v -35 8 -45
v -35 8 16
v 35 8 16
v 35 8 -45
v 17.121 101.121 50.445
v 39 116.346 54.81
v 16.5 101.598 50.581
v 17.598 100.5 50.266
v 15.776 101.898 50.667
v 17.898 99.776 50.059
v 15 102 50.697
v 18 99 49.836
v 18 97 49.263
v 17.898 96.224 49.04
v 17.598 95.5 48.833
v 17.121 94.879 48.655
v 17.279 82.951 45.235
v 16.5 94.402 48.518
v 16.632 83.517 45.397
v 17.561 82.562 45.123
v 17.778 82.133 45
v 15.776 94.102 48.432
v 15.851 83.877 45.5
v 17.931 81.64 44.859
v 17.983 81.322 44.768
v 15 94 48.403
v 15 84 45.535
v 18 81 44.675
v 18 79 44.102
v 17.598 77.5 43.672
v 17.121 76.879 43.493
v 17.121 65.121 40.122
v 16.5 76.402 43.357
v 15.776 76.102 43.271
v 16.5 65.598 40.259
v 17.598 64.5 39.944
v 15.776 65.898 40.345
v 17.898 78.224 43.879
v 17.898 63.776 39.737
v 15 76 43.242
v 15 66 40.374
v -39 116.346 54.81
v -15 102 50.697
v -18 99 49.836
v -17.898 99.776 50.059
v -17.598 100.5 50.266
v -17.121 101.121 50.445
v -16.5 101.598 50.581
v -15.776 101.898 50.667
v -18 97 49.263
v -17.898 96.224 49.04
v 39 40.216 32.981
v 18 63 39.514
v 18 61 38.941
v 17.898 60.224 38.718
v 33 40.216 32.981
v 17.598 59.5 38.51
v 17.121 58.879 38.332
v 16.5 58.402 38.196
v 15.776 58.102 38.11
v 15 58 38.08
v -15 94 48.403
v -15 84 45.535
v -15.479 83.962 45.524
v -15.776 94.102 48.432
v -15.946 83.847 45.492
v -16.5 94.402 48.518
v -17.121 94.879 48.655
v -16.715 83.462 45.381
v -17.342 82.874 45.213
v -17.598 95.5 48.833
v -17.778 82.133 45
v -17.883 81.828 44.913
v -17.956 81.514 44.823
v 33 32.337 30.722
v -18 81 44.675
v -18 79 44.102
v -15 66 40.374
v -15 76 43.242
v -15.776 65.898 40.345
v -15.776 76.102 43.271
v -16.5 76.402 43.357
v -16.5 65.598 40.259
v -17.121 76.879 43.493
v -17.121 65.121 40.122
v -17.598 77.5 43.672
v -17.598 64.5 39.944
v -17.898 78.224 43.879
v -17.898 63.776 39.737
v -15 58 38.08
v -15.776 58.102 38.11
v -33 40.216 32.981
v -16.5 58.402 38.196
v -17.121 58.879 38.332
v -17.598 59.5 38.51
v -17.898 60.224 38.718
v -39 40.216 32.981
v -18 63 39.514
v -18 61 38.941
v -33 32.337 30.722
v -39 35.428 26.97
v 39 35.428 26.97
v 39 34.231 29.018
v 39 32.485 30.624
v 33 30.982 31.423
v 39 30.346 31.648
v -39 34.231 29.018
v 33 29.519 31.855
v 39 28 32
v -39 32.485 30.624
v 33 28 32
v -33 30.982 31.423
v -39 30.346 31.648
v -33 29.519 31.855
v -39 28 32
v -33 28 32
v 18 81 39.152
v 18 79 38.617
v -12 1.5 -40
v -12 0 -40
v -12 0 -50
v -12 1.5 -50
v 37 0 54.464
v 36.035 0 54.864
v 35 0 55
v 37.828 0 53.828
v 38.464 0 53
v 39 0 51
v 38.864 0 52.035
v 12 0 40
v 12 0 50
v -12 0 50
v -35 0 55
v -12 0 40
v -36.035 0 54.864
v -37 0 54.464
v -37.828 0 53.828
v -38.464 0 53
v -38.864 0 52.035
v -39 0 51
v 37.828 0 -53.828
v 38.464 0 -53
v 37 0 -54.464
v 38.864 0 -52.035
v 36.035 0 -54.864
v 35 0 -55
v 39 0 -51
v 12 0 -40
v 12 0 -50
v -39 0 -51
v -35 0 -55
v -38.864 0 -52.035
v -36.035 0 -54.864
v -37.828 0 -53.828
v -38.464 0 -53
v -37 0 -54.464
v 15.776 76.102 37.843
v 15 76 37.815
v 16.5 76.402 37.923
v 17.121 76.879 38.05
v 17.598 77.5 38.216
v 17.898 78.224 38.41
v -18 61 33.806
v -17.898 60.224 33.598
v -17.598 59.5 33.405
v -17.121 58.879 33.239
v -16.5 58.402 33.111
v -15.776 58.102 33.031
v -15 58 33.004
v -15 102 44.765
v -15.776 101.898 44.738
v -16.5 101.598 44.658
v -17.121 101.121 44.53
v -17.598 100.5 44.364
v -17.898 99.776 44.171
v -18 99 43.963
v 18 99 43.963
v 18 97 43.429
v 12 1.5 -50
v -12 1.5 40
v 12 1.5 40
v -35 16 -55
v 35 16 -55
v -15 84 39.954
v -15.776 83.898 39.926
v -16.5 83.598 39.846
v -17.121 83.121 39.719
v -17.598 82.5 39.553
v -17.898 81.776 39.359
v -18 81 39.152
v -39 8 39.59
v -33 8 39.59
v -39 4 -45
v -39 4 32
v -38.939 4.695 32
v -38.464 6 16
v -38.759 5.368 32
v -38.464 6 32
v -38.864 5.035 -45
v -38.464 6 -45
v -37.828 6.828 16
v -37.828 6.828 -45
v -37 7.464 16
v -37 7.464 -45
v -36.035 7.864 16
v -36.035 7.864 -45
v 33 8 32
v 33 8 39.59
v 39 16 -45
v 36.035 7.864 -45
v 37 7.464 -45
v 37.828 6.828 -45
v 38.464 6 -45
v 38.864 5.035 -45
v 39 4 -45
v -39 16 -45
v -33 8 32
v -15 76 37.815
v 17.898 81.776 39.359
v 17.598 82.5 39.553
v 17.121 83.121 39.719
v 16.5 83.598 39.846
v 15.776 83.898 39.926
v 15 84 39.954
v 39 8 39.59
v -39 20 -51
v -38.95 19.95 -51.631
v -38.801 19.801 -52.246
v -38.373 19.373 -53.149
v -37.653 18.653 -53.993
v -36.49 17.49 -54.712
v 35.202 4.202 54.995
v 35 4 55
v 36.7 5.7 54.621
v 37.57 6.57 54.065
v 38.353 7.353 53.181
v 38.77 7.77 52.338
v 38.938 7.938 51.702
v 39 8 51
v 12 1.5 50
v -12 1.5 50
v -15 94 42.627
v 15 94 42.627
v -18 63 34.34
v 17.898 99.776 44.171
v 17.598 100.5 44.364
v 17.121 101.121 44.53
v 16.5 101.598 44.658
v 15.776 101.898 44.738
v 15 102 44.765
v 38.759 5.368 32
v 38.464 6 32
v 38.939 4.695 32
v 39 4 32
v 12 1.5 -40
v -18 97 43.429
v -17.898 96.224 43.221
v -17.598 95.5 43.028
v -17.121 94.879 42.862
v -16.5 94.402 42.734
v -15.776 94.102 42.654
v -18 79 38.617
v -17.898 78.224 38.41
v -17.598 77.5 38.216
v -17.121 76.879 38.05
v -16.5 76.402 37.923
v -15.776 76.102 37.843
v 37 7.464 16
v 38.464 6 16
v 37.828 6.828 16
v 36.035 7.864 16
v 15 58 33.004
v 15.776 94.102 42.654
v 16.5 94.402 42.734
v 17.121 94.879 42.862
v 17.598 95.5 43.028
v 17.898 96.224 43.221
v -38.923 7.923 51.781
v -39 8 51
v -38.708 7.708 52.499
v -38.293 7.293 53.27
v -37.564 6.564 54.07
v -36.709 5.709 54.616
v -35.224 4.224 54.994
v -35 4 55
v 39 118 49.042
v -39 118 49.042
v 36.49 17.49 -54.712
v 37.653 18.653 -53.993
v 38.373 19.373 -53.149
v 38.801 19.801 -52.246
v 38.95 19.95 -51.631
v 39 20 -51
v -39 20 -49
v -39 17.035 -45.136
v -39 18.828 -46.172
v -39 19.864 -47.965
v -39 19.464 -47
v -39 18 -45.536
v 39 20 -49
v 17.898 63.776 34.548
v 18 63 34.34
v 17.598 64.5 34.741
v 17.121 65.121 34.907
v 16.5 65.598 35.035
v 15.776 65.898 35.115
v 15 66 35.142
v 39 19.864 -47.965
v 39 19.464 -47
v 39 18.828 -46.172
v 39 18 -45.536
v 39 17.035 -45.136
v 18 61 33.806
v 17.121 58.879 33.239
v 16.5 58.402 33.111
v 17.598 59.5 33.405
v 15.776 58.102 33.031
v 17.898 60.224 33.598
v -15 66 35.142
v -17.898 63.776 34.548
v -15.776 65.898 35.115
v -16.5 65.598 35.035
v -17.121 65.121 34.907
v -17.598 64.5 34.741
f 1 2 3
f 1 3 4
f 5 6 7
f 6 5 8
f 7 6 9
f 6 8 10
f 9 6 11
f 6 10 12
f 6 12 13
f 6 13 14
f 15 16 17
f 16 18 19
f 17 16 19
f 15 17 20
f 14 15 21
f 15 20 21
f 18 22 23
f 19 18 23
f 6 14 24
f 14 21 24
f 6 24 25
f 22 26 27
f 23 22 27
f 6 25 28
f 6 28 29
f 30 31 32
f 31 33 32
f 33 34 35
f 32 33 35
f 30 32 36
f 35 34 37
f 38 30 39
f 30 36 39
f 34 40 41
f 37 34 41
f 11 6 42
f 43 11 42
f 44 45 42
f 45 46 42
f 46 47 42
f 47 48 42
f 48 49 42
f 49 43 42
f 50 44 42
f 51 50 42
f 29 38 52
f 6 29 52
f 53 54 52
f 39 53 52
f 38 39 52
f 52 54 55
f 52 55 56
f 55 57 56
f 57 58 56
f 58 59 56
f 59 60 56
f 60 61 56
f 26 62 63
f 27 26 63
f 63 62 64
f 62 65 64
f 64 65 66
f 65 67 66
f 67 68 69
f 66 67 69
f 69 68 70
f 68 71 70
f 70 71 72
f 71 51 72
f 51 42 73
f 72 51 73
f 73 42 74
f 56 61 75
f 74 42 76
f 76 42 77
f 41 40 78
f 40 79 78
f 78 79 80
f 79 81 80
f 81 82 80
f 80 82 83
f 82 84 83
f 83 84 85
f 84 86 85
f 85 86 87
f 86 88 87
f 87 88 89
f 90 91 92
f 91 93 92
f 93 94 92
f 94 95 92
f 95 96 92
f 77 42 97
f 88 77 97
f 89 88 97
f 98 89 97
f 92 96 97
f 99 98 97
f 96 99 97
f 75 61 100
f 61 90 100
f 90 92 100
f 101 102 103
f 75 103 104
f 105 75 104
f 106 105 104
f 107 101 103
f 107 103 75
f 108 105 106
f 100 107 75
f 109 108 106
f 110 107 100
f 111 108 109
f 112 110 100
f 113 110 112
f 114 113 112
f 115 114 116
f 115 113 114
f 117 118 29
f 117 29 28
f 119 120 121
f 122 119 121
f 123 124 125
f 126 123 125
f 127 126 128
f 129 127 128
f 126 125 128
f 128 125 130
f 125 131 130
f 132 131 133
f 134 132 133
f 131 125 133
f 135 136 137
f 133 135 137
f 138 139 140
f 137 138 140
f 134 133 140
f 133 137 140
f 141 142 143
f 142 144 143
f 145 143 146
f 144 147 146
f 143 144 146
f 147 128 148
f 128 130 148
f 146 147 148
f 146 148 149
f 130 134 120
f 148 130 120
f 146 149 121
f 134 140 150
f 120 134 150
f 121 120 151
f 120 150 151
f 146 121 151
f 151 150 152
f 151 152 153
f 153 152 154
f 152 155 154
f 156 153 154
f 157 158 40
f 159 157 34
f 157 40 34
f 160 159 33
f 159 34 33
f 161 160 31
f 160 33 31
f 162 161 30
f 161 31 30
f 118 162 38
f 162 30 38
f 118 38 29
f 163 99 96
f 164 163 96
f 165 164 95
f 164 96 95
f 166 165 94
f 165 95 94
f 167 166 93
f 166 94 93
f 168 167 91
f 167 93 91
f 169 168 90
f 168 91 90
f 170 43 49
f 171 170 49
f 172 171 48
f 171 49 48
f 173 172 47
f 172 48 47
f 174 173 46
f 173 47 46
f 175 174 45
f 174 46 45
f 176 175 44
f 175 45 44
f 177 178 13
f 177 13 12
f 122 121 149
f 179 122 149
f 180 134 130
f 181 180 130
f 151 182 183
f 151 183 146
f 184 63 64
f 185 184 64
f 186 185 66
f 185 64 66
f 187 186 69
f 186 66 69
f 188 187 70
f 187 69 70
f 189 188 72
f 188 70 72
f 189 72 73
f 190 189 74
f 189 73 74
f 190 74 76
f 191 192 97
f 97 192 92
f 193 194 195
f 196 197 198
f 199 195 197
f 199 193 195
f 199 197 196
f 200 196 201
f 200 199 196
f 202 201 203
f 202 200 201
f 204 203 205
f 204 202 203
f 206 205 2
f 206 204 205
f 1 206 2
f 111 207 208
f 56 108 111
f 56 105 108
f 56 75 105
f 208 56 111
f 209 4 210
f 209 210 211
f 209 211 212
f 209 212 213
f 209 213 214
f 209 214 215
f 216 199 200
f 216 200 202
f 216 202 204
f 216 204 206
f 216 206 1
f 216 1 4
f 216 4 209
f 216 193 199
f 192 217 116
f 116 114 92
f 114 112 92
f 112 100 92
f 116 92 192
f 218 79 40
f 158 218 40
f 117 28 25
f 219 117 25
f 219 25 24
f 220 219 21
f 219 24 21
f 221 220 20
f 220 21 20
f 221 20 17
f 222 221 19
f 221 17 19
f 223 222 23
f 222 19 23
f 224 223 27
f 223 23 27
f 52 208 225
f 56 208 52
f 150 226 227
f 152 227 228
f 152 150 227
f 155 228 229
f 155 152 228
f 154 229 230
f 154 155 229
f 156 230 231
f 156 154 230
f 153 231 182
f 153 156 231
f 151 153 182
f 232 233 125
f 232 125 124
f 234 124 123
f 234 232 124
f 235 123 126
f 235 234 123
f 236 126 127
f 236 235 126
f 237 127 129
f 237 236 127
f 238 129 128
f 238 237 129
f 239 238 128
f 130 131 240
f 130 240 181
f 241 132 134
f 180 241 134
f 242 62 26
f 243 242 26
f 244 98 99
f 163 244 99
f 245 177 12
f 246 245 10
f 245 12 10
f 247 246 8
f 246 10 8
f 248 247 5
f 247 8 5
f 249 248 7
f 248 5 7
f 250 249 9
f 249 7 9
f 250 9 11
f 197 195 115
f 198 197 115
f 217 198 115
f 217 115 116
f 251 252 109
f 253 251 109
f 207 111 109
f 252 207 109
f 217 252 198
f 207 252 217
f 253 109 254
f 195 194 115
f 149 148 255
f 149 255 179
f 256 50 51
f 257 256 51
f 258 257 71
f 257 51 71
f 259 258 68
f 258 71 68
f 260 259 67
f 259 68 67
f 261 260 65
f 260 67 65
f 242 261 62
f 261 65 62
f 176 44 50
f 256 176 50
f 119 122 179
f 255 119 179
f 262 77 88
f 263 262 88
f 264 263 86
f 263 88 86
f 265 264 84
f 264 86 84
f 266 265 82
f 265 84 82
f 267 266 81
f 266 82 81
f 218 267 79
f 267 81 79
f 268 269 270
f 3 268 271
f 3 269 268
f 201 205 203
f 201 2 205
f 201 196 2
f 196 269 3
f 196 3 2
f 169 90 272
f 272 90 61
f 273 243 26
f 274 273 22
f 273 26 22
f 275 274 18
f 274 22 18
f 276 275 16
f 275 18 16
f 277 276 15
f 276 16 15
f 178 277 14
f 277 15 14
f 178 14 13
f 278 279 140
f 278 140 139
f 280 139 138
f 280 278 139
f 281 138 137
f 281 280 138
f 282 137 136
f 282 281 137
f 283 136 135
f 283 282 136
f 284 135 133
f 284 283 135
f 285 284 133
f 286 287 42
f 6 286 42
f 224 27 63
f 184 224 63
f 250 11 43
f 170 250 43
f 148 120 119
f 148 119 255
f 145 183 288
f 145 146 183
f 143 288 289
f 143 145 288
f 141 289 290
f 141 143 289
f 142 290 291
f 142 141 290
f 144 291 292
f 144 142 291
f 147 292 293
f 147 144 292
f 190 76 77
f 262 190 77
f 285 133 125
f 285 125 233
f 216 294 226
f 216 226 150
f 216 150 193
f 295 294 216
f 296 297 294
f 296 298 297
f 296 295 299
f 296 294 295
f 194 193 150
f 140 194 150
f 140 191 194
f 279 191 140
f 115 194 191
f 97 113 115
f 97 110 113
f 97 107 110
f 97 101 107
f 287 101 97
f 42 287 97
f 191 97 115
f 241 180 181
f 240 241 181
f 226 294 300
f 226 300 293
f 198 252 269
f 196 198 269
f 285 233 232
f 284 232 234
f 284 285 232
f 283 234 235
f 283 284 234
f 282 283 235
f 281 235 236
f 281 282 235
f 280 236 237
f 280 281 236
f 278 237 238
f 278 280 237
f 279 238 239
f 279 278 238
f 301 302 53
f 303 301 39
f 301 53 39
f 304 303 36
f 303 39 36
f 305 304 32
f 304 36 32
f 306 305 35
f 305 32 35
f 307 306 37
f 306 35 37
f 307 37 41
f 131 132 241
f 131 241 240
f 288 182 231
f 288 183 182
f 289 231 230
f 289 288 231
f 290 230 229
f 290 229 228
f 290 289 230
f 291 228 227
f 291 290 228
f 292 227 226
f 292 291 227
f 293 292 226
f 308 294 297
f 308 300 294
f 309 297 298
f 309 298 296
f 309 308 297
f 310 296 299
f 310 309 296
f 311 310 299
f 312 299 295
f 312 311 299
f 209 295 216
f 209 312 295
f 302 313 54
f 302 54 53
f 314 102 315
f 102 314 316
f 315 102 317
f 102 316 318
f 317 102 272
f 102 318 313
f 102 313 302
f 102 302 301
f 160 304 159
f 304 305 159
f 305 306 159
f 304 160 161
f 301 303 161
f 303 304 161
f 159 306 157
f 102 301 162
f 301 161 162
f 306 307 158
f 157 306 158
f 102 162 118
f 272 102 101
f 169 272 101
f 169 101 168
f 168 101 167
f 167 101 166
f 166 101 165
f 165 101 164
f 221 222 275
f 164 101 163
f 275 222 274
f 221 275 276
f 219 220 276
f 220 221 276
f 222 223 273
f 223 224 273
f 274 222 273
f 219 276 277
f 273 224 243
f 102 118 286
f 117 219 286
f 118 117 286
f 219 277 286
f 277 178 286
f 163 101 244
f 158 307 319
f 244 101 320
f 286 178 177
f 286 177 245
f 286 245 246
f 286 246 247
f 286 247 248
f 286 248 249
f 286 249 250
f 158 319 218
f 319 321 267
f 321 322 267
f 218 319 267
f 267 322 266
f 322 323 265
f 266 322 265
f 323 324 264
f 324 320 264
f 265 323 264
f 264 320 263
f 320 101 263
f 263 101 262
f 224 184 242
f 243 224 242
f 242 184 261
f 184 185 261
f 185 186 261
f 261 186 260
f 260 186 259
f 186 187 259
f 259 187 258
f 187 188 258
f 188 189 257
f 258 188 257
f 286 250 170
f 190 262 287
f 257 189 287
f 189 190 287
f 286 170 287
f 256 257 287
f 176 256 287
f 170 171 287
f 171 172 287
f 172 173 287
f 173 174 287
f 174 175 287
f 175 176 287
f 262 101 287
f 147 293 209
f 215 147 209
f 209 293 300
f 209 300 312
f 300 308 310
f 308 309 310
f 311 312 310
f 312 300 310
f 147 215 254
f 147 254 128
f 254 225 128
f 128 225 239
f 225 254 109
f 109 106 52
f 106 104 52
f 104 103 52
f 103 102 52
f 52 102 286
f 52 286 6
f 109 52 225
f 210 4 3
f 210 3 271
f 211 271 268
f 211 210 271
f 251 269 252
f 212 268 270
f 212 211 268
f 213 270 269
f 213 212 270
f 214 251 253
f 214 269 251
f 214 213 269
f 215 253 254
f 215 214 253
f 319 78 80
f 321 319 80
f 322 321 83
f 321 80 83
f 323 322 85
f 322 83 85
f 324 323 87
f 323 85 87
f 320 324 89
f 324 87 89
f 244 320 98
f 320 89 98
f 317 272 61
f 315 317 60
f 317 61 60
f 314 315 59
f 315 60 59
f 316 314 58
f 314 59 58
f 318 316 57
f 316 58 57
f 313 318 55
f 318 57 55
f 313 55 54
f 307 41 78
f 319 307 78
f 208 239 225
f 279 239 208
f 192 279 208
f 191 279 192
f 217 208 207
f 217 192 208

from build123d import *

# Parameters (mm, degrees)
EXTRUDE_1_DEPTH     = 78
EXTRUDE_2_DEPTH     = 78
EXTRUDE_4_DEPTH     = 6
CUT_EXTRUDE_3_DEPTH = 80
CUT_EXTRUDE_4_DEPTH = 160.514889587
CUT_EXTRUDE_5_DEPTH = 170.32217811
SKETCH_10_W         = 24
SKETCH_10_H         = 10
CUT_EXTRUDE_6_DEPTH = 1.5
FILLET_1_R          = 4
FILLET_START        = -45
FILLET_6_DEPTH      = 77
FILLET_START_2      = -39
FILLET_6_2_DEPTH    = 78


with BuildPart() as part:
    # 草图1 → 凸台-拉伸1 (new body)
    with BuildSketch(Plane(origin=(-39, 0, 0), x_dir=(0, 0, -1), z_dir=(1, 0, 0))):
        Polygon((55, 0), (-55, 0), (-55, 8), (45, 8), (45, 20), (55, 20), align=None)
    extrude(amount=EXTRUDE_1_DEPTH)

    # 草图2 → 凸台-拉伸2 (add)
    with BuildSketch(Plane(origin=(-39, 0, 0), x_dir=(0, 0, -1), z_dir=(1, 0, 0))):
        Polygon((-17.5, 0), (-49.042, 118), (-54.81, 116.346), (-21.45, 0), align=None)
    extrude(amount=EXTRUDE_2_DEPTH)

    # 草图4 → 凸台-拉伸4 (add)
    with BuildSketch(Plane(origin=(33, 0, 0), x_dir=(0, 0, -1), z_dir=(1, 0, 0))):
        Polygon((-20, 6), (-40, 6), (-32, 45), align=None)
    extrude_4 = extrude(amount=EXTRUDE_4_DEPTH)

    # 镜向1: 凸台-拉伸4 across plane
    add(extrude_4.mirror(Plane(origin=(0, 0, 0), x_dir=(0, 0, 1), z_dir=(1, 0, 0))))

    # 草图7 → 切除-拉伸3 (cut)
    with BuildSketch(Plane(origin=(-40, 0, 0), x_dir=(0, 0, -1), z_dir=(1, 0, 0))):
        with BuildLine():
            Line((-16, 6), (-16, 28))
            ThreePointArc((-16, 28), (-24, 36), (-32, 28))
            Line((-32, 28), (-32, 6))
            Line((-32, 6), (-16, 6))
        make_face()
    extrude(amount=CUT_EXTRUDE_3_DEPTH, mode=Mode.SUBTRACT)

    # 草图8 → 切除-拉伸4 (cut, through all)
    with BuildSketch(Plane.XY.offset(45)):
        with BuildLine():
            Line((-15, 58), (15, 58))
            ThreePointArc((15, 58), (17.121320344, 58.878679656), (18, 61))
            Line((18, 61), (18, 63))
            ThreePointArc((18, 63), (17.121320344, 65.121320344), (15, 66))
            Line((15, 66), (-15, 66))
            ThreePointArc((-15, 66), (-17.121320344, 65.121320344), (-18, 63))
            Line((-18, 63), (-18, 61))
            ThreePointArc((-18, 61), (-17.121320344, 58.878679656), (-15, 58))
        make_face()
        with BuildLine():
            Line((-15, 76), (15, 76))
            ThreePointArc((15, 76), (17.121320344, 76.878679656), (18, 79))
            Line((18, 79), (18, 81))
            ThreePointArc((18, 81), (17.121320344, 83.121320344), (15, 84))
            Line((15, 84), (-15, 84))
            ThreePointArc((-15, 84), (-17.121320344, 83.121320344), (-18, 81))
            Line((-18, 81), (-18, 79))
            ThreePointArc((-18, 79), (-17.121320344, 76.878679656), (-15, 76))
        make_face()
        with BuildLine():
            Line((-15, 94), (15, 94))
            ThreePointArc((15, 94), (17.121320344, 94.878679656), (18, 97))
            Line((18, 97), (18, 99))
            ThreePointArc((18, 99), (17.121320344, 101.121320344), (15, 102))
            Line((15, 102), (-15, 102))
            ThreePointArc((-15, 102), (-17.121320344, 101.121320344), (-18, 99))
            Line((-18, 99), (-18, 97))
            ThreePointArc((-18, 97), (-17.121320344, 94.878679656), (-15, 94))
        make_face()
    extrude(amount=-CUT_EXTRUDE_4_DEPTH, mode=Mode.SUBTRACT)

    # 草图9 → 切除-拉伸5 (cut, through all)
    with BuildSketch(Plane.XY.offset(60)):
        with BuildLine():
            Line((-15, 58), (15, 58))
            ThreePointArc((15, 58), (17.121320344, 58.878679656), (18, 61))
            Line((18, 61), (18, 63))
            ThreePointArc((18, 63), (17.121320344, 65.121320344), (15, 66))
            Line((15, 66), (-15, 66))
            ThreePointArc((-15, 66), (-17.121320344, 65.121320344), (-18, 63))
            Line((-18, 63), (-18, 61))
            ThreePointArc((-18, 61), (-17.121320344, 58.878679656), (-15, 58))
        make_face()
        with BuildLine():
            Line((-15, 76), (15, 76))
            ThreePointArc((15, 76), (17.121320344, 76.878679656), (18, 79))
            Line((18, 79), (18, 81))
            ThreePointArc((18, 81), (17.121320344, 83.121320344), (15, 84))
            Line((15, 84), (-15, 84))
            ThreePointArc((-15, 84), (-17.121320344, 83.121320344), (-18, 81))
            Line((-18, 81), (-18, 79))
            ThreePointArc((-18, 79), (-17.121320344, 76.878679656), (-15, 76))
        make_face()
        with BuildLine():
            Line((-15, 94), (15, 94))
            ThreePointArc((15, 94), (17.121320344, 94.878679656), (18, 97))
            Line((18, 97), (18, 99))
            ThreePointArc((18, 99), (17.121320344, 101.121320344), (15, 102))
            Line((15, 102), (-15, 102))
            ThreePointArc((-15, 102), (-17.121320344, 101.121320344), (-18, 99))
            Line((-18, 99), (-18, 97))
            ThreePointArc((-18, 97), (-17.121320344, 94.878679656), (-15, 94))
        make_face()
    extrude(amount=-CUT_EXTRUDE_5_DEPTH, mode=Mode.SUBTRACT)

    # 草图10 → 切除-拉伸6 (cut)
    with BuildSketch(Plane(origin=(0, 0, 0), x_dir=(1, 0, 0), z_dir=(0, 1, 0))):
        with Locations((0, 45)):
            Rectangle(SKETCH_10_W, SKETCH_10_H)
        with Locations((0, -45)):
            Rectangle(SKETCH_10_W, SKETCH_10_H)
    extrude(amount=CUT_EXTRUDE_6_DEPTH, mode=Mode.SUBTRACT)

    # 圆角1
    fillet_1_edges = [part.edges().sort_by_distance(p)[0] for p in [
        (0, 20, -45),
        (0, 20, -55),
        (39, 4, 55),
        (39, 10, -55),
        (-39, 4, 55),
        (-39, 10, -55),
    ]]
    fillet(fillet_1_edges, radius=FILLET_1_R)

    # 圆角6: read off the stored shape, not the designer's step
    # 圆角6 outline → 圆角6 (cut)
    with BuildSketch(Plane.XY.offset(FILLET_START)):
        with BuildLine():
            Line((-39, 8), (-39, 4))
            ThreePointArc((-39, 4), (-37.828427125, 6.828427125), (-35, 8))
            Line((-35, 8), (-39, 8))
        make_face()
        with BuildLine():
            Line((39, 8), (35, 8))
            ThreePointArc((35, 8), (37.828427125, 6.828427125), (39, 4))
            Line((39, 4), (39, 8))
        make_face()
    extrude(amount=FILLET_6_DEPTH, mode=Mode.SUBTRACT)

    # Fillet 6 2 outline → Fillet 6 2 (cut)
    with BuildSketch(Plane.YZ.offset(FILLET_START_2)):
        with BuildLine():
            Line((8, 55), (4, 55))
            ThreePointArc((4, 55), (6.828427125, 53.828427125), (8, 51))
            Line((8, 51), (8, 55))
        make_face()
    extrude(amount=FILLET_6_2_DEPTH, mode=Mode.SUBTRACT)


solid = part.part
